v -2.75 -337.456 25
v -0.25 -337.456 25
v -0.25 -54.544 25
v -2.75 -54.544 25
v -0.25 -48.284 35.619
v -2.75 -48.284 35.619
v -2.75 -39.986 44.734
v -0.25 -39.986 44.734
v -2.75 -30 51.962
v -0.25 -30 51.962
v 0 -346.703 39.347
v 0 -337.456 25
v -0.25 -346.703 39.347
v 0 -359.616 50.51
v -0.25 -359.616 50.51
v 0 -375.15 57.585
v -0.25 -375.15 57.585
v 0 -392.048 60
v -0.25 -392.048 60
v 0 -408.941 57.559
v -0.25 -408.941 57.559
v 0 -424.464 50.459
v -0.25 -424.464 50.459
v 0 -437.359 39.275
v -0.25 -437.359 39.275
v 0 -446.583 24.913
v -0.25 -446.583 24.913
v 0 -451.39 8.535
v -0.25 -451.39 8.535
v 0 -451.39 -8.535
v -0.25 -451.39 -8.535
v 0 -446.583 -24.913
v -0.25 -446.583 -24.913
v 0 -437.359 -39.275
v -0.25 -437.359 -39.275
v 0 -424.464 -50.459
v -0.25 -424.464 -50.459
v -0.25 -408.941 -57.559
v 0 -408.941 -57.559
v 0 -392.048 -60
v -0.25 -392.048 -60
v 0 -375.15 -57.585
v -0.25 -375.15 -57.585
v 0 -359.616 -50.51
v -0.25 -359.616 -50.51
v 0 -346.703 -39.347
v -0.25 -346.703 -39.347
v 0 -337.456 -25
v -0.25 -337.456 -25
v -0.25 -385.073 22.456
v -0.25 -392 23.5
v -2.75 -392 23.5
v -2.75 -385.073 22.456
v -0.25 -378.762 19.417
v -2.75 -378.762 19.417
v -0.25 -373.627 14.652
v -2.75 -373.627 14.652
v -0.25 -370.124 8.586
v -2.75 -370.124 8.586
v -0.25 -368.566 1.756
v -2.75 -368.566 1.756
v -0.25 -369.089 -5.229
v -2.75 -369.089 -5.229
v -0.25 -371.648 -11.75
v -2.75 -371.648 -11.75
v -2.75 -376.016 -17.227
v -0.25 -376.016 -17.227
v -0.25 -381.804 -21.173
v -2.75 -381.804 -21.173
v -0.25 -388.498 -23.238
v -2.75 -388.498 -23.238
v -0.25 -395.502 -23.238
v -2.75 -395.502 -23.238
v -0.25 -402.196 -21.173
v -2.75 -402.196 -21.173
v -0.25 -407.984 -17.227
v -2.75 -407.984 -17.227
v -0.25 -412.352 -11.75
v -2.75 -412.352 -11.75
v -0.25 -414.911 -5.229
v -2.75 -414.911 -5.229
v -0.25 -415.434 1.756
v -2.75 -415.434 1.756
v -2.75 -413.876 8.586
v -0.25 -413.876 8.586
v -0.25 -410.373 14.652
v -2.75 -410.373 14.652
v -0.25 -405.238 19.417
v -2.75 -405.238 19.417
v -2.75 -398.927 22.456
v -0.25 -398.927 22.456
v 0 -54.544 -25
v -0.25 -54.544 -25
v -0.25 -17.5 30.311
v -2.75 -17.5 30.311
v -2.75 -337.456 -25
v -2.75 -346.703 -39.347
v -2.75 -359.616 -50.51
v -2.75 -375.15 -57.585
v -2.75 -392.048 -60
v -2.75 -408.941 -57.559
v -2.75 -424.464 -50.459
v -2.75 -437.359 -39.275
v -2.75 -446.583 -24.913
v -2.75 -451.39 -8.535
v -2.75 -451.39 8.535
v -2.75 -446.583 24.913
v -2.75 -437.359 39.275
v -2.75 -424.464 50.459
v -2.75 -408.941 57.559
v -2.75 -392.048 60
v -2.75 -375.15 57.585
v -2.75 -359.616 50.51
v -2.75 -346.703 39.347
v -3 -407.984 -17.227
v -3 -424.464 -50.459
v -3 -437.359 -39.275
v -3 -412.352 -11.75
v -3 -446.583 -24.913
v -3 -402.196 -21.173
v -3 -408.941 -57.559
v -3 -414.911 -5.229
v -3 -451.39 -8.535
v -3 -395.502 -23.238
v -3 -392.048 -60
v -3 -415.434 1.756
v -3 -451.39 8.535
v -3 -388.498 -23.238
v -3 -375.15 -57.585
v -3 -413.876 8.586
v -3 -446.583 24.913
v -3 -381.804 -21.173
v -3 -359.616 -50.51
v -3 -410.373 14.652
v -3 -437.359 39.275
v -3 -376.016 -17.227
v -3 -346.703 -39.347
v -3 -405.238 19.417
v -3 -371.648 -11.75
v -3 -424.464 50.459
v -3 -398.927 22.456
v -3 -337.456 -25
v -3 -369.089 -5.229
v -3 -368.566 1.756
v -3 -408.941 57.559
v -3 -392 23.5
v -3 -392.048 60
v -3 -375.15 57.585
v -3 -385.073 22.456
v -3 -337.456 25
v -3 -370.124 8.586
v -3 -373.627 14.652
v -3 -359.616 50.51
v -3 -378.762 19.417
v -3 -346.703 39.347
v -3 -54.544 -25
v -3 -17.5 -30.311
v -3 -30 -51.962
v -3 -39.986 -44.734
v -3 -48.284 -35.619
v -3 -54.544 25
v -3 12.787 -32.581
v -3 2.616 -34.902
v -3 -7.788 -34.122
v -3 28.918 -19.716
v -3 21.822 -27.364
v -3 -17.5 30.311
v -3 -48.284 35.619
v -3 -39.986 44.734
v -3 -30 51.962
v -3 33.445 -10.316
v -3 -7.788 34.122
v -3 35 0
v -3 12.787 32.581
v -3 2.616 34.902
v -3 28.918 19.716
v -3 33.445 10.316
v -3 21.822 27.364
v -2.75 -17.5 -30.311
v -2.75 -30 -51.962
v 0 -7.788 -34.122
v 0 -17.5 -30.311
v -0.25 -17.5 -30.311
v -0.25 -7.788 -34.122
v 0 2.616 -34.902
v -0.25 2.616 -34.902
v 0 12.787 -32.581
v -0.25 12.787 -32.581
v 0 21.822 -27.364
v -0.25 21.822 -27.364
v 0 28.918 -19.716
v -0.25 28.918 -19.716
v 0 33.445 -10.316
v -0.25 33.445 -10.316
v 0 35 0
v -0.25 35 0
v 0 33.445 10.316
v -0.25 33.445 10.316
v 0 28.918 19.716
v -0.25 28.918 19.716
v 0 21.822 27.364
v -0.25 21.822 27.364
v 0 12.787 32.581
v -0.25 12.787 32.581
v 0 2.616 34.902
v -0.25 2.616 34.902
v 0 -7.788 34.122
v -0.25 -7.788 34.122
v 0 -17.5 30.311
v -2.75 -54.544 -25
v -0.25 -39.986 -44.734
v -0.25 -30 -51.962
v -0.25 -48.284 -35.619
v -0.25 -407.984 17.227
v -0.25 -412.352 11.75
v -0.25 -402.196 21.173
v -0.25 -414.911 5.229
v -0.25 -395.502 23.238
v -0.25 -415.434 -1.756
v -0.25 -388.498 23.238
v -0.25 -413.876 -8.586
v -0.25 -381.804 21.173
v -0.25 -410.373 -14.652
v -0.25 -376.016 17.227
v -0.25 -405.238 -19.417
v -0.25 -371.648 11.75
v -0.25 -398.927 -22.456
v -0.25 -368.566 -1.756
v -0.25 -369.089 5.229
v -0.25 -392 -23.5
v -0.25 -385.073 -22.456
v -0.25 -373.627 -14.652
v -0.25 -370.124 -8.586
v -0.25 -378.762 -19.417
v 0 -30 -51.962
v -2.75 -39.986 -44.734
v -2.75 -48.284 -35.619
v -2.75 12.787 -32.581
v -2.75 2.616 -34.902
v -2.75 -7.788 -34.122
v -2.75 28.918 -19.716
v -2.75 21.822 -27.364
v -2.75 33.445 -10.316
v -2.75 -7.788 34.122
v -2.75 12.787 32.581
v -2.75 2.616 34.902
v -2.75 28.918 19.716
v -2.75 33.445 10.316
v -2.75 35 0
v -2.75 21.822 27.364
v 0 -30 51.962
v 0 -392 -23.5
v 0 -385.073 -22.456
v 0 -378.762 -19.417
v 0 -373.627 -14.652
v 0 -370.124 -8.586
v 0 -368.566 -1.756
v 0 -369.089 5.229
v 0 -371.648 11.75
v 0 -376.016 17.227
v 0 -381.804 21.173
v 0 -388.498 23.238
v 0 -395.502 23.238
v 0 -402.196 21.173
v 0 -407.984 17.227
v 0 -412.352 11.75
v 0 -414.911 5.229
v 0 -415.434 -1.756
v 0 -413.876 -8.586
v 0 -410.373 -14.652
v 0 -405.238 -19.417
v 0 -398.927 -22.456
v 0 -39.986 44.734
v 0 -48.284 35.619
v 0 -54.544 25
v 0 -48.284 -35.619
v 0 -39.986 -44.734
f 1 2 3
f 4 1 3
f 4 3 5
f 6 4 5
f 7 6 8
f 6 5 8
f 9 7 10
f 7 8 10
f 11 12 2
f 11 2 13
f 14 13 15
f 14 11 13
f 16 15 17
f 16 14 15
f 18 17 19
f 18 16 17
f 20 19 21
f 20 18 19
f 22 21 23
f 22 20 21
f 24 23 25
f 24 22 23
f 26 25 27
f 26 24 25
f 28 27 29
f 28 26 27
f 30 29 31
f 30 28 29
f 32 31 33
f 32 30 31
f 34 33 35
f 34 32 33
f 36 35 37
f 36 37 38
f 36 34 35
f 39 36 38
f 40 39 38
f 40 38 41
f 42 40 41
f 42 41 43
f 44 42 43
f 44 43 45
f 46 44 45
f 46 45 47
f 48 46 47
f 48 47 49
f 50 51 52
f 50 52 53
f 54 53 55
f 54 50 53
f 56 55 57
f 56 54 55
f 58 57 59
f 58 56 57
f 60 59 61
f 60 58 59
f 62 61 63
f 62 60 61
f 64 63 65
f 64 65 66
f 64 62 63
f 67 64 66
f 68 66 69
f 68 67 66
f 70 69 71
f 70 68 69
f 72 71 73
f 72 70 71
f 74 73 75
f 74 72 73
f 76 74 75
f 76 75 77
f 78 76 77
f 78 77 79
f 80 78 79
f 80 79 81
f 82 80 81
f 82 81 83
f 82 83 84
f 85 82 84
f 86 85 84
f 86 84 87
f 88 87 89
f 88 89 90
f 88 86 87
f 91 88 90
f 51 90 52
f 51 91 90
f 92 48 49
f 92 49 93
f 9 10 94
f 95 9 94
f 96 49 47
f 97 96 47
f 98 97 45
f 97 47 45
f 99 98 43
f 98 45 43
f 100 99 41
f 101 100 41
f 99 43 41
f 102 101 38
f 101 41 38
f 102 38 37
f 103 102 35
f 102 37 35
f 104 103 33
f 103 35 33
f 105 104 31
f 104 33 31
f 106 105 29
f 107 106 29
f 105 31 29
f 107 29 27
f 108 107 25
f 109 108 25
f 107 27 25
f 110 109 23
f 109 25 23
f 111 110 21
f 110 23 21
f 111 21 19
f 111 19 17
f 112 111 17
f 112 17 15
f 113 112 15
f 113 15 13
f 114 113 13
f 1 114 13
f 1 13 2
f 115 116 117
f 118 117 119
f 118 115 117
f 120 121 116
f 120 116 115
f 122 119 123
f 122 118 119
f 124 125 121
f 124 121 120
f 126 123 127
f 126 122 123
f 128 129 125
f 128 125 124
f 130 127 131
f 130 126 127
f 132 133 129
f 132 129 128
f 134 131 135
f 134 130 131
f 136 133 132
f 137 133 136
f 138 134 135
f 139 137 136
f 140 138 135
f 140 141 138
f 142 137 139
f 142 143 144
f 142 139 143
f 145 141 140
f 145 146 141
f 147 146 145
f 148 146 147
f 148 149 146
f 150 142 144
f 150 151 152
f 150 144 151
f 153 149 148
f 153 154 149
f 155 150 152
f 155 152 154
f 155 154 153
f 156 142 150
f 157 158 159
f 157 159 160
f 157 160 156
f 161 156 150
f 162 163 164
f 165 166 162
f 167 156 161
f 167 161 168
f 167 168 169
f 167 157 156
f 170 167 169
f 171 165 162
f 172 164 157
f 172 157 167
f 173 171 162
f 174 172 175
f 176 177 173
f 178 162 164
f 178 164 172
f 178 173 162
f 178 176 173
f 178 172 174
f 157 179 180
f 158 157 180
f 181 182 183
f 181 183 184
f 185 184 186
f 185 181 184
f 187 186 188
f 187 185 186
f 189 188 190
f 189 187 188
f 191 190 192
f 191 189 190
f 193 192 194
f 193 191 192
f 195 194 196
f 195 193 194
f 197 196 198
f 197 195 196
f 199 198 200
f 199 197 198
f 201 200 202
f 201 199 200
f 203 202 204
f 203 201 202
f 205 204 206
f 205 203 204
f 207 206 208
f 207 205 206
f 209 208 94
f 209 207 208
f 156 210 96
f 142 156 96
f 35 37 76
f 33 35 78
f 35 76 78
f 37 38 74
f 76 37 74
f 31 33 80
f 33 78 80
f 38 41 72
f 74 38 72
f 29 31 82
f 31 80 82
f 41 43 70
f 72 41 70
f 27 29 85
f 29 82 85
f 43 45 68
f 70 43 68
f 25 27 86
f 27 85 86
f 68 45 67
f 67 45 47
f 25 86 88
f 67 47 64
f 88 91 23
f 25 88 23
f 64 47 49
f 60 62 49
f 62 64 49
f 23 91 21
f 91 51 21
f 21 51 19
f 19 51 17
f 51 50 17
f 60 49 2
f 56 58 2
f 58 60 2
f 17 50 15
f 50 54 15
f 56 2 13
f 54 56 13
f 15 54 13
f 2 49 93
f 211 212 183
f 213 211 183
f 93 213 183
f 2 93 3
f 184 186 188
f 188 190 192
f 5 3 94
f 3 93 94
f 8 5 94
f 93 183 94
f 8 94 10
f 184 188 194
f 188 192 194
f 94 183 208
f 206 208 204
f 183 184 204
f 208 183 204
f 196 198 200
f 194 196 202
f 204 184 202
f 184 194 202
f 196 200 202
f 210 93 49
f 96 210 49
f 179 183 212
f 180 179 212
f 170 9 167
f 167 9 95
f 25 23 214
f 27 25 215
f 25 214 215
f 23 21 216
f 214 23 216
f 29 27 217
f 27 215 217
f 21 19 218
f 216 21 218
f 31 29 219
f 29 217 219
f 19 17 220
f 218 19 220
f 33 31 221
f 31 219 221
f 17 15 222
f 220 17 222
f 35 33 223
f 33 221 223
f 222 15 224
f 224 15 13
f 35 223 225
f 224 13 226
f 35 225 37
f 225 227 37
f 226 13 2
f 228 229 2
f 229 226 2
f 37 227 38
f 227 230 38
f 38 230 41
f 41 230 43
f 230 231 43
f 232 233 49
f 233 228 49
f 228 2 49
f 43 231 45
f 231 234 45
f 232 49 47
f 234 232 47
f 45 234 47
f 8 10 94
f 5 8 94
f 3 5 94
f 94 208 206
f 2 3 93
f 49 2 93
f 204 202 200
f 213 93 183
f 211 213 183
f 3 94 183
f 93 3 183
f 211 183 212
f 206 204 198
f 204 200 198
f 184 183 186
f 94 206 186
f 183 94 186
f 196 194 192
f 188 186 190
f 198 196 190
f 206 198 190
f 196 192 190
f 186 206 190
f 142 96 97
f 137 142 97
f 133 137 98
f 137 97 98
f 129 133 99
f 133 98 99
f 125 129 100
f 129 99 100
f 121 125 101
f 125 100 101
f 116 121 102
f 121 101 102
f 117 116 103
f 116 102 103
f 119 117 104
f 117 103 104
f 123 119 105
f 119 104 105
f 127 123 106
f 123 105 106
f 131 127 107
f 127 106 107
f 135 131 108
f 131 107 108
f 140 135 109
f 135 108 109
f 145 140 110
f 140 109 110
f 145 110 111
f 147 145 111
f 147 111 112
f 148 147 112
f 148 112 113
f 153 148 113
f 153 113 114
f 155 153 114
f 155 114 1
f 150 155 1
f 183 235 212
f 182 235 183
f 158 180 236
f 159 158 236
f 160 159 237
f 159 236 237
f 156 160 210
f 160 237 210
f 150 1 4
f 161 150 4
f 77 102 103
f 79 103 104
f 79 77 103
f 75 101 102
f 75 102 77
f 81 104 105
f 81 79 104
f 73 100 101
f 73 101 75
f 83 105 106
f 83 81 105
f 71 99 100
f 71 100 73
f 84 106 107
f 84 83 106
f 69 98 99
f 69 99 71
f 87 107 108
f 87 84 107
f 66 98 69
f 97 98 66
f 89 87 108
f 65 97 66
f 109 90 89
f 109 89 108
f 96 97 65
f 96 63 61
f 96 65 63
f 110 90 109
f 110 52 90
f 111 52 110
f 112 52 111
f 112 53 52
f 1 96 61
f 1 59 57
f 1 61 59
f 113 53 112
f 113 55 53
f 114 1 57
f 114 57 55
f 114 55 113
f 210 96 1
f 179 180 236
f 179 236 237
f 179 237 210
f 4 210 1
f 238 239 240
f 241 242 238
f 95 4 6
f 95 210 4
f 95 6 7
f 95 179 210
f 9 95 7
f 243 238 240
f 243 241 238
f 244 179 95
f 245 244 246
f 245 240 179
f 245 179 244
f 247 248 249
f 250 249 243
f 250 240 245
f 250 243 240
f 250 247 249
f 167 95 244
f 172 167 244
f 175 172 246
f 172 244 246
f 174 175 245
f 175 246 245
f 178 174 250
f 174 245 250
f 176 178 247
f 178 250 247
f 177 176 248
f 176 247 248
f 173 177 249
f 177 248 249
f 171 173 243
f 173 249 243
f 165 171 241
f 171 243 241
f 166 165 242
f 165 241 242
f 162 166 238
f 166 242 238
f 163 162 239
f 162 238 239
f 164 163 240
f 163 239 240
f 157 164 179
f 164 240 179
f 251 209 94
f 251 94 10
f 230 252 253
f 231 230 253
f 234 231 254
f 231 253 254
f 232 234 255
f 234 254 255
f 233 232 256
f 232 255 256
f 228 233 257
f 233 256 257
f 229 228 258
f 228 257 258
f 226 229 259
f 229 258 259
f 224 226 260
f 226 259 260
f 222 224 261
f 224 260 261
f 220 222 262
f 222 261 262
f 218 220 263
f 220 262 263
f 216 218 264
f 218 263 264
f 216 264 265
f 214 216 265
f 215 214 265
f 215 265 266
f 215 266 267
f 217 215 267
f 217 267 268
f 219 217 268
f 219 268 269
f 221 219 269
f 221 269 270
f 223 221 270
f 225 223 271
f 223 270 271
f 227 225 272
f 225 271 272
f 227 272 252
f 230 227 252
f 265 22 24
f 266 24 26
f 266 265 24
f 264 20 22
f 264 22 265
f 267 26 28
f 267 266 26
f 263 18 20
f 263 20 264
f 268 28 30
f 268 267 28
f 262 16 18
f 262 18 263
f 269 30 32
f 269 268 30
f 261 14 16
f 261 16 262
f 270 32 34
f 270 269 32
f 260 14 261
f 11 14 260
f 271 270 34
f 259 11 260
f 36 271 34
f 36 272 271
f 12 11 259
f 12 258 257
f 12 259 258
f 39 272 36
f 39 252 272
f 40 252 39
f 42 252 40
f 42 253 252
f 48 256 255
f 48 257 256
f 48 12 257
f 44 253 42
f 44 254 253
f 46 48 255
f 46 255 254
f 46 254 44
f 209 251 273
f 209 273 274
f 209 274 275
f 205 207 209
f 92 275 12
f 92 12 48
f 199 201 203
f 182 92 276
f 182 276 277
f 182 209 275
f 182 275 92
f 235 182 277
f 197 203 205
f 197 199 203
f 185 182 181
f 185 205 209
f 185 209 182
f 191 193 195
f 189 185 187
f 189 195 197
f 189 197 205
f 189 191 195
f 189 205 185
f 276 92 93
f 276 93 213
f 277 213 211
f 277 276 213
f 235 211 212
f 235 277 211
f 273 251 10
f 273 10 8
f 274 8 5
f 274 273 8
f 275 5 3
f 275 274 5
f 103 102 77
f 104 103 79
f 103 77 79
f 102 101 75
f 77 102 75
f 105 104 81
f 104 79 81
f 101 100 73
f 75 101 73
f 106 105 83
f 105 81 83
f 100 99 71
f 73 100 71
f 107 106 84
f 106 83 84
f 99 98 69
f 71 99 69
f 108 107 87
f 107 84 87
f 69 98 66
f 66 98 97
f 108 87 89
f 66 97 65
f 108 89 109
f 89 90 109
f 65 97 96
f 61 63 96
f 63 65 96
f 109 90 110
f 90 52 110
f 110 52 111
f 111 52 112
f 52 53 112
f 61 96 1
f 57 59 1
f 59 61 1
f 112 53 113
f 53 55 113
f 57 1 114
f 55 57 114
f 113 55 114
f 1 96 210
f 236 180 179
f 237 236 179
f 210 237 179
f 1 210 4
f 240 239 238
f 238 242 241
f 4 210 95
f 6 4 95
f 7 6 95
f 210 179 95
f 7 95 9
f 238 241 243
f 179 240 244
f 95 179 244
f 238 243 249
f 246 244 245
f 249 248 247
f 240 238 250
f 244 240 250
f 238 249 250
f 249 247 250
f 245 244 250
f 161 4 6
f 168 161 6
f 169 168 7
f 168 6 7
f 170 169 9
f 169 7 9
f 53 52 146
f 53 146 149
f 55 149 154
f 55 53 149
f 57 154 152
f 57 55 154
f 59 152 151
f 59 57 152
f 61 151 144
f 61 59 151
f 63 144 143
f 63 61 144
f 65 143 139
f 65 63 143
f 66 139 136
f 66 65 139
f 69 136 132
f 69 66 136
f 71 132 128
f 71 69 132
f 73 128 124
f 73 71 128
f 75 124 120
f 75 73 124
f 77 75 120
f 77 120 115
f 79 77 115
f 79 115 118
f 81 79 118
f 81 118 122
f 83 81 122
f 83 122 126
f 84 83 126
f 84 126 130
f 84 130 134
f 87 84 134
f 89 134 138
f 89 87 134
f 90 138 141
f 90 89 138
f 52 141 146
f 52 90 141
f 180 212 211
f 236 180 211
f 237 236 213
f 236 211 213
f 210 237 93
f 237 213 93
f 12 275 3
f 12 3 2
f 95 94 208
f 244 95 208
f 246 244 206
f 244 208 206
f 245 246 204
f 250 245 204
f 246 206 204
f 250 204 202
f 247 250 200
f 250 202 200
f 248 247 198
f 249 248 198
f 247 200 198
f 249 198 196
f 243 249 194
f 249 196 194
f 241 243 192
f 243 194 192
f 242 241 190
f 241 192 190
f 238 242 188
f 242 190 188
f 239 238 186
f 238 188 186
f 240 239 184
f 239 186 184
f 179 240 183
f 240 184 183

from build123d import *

# Parameters (mm, degrees)
SKETCH1_R           = 35
SKETCH1_R_2         = 60
SKETCH1_R_3         = 23.5
BOSS_EXTRUDE1_DEPTH = 0.25
SKETCH2_R           = 23.5
BOSS_EXTRUDE2_DEPTH = 2.5
SKETCH4_R           = 23.5
BOSS_EXTRUDE3_DEPTH = 0.25


with BuildPart() as part:
    # Sketch1 → Boss-Extrude1 (new body)
    with BuildSketch(Plane(origin=(0, 0, 0), x_dir=(0, 0, -1), z_dir=(1, 0, 0))):
        Circle(SKETCH1_R)
        with BuildLine():
            ThreePointArc((30.310889132, -17.5), (0, -35), (-30.310889132, -17.5))
            Line((-30.310889132, -17.5), (-51.961524227, -30))
            ThreePointArc((-51.961524227, -30), (-40.390167668, -44.369295191), (-25, -54.543560573))
            ThreePointArc((-25, -54.543560573), (0, -60), (25, -54.543560573))
            ThreePointArc((25, -54.543560573), (40.390167668, -44.369295191), (51.961524227, -30))
            Line((51.961524227, -30), (30.310889132, -17.5))
        make_face()
        with BuildLine():
            ThreePointArc((25, -54.543560573), (0, -60), (-25, -54.543560573))
            Line((-25, -54.543560573), (-25, -337.456439427))
            ThreePointArc((-25, -337.456439427), (0, -332), (25, -337.456439427))
            Line((25, -337.456439427), (25, -54.543560573))
        make_face()
        with Locations((0, -392)):
            Circle(SKETCH1_R_2)
        with Locations((0, -392)):
            Circle(SKETCH1_R_3, mode=Mode.SUBTRACT)
    extrude(amount=-BOSS_EXTRUDE1_DEPTH)


with BuildPart() as body_2:
    # Sketch2 → Boss-Extrude2 (new body)
    with BuildSketch(Plane.ZY.offset(0.25)):
        with BuildLine():
            Line((-30.310889132, -17.5), (-51.961524227, -30))
            ThreePointArc((-51.961524227, -30), (-40.390167668, -44.369295191), (-25, -54.543560573))
            Line((-25, -54.543560573), (-25, -337.456439427))
            ThreePointArc((-25, -337.456439427), (0, -452), (25, -337.456439427))
            Line((25, -337.456439427), (25, -54.543560573))
            ThreePointArc((25, -54.543560573), (40.390167668, -44.369295191), (51.961524227, -30))
            Line((51.961524227, -30), (30.310889132, -17.5))
            ThreePointArc((30.310889132, -17.5), (0, 35), (-30.310889132, -17.5))
        make_face()
        with Locations((0, -392)):
            Circle(SKETCH2_R, mode=Mode.SUBTRACT)
    extrude(amount=BOSS_EXTRUDE2_DEPTH)


with BuildPart() as body_3:
    # Sketch4 → Boss-Extrude3 (new body)
    with BuildSketch(Plane.ZY.offset(2.75)):
        with BuildLine():
            Line((51.961524227, -30), (30.310889132, -17.5))
            ThreePointArc((30.310889132, -17.5), (0, 35), (-30.310889132, -17.5))
            Line((-30.310889132, -17.5), (-51.961524227, -30))
            ThreePointArc((-51.961524227, -30), (-40.390167668, -44.369295191), (-25, -54.543560573))
            Line((-25, -54.543560573), (-25, -337.456439427))
            ThreePointArc((-25, -337.456439427), (0, -452), (25, -337.456439427))
            Line((25, -337.456439427), (25, -54.543560573))
            ThreePointArc((25, -54.543560573), (40.390167668, -44.369295191), (51.961524227, -30))
        make_face()
        with Locations((0, -392)):
            Circle(SKETCH4_R, mode=Mode.SUBTRACT)
    extrude(amount=BOSS_EXTRUDE3_DEPTH)


solid = Compound([part.part, body_2.part, body_3.part])
